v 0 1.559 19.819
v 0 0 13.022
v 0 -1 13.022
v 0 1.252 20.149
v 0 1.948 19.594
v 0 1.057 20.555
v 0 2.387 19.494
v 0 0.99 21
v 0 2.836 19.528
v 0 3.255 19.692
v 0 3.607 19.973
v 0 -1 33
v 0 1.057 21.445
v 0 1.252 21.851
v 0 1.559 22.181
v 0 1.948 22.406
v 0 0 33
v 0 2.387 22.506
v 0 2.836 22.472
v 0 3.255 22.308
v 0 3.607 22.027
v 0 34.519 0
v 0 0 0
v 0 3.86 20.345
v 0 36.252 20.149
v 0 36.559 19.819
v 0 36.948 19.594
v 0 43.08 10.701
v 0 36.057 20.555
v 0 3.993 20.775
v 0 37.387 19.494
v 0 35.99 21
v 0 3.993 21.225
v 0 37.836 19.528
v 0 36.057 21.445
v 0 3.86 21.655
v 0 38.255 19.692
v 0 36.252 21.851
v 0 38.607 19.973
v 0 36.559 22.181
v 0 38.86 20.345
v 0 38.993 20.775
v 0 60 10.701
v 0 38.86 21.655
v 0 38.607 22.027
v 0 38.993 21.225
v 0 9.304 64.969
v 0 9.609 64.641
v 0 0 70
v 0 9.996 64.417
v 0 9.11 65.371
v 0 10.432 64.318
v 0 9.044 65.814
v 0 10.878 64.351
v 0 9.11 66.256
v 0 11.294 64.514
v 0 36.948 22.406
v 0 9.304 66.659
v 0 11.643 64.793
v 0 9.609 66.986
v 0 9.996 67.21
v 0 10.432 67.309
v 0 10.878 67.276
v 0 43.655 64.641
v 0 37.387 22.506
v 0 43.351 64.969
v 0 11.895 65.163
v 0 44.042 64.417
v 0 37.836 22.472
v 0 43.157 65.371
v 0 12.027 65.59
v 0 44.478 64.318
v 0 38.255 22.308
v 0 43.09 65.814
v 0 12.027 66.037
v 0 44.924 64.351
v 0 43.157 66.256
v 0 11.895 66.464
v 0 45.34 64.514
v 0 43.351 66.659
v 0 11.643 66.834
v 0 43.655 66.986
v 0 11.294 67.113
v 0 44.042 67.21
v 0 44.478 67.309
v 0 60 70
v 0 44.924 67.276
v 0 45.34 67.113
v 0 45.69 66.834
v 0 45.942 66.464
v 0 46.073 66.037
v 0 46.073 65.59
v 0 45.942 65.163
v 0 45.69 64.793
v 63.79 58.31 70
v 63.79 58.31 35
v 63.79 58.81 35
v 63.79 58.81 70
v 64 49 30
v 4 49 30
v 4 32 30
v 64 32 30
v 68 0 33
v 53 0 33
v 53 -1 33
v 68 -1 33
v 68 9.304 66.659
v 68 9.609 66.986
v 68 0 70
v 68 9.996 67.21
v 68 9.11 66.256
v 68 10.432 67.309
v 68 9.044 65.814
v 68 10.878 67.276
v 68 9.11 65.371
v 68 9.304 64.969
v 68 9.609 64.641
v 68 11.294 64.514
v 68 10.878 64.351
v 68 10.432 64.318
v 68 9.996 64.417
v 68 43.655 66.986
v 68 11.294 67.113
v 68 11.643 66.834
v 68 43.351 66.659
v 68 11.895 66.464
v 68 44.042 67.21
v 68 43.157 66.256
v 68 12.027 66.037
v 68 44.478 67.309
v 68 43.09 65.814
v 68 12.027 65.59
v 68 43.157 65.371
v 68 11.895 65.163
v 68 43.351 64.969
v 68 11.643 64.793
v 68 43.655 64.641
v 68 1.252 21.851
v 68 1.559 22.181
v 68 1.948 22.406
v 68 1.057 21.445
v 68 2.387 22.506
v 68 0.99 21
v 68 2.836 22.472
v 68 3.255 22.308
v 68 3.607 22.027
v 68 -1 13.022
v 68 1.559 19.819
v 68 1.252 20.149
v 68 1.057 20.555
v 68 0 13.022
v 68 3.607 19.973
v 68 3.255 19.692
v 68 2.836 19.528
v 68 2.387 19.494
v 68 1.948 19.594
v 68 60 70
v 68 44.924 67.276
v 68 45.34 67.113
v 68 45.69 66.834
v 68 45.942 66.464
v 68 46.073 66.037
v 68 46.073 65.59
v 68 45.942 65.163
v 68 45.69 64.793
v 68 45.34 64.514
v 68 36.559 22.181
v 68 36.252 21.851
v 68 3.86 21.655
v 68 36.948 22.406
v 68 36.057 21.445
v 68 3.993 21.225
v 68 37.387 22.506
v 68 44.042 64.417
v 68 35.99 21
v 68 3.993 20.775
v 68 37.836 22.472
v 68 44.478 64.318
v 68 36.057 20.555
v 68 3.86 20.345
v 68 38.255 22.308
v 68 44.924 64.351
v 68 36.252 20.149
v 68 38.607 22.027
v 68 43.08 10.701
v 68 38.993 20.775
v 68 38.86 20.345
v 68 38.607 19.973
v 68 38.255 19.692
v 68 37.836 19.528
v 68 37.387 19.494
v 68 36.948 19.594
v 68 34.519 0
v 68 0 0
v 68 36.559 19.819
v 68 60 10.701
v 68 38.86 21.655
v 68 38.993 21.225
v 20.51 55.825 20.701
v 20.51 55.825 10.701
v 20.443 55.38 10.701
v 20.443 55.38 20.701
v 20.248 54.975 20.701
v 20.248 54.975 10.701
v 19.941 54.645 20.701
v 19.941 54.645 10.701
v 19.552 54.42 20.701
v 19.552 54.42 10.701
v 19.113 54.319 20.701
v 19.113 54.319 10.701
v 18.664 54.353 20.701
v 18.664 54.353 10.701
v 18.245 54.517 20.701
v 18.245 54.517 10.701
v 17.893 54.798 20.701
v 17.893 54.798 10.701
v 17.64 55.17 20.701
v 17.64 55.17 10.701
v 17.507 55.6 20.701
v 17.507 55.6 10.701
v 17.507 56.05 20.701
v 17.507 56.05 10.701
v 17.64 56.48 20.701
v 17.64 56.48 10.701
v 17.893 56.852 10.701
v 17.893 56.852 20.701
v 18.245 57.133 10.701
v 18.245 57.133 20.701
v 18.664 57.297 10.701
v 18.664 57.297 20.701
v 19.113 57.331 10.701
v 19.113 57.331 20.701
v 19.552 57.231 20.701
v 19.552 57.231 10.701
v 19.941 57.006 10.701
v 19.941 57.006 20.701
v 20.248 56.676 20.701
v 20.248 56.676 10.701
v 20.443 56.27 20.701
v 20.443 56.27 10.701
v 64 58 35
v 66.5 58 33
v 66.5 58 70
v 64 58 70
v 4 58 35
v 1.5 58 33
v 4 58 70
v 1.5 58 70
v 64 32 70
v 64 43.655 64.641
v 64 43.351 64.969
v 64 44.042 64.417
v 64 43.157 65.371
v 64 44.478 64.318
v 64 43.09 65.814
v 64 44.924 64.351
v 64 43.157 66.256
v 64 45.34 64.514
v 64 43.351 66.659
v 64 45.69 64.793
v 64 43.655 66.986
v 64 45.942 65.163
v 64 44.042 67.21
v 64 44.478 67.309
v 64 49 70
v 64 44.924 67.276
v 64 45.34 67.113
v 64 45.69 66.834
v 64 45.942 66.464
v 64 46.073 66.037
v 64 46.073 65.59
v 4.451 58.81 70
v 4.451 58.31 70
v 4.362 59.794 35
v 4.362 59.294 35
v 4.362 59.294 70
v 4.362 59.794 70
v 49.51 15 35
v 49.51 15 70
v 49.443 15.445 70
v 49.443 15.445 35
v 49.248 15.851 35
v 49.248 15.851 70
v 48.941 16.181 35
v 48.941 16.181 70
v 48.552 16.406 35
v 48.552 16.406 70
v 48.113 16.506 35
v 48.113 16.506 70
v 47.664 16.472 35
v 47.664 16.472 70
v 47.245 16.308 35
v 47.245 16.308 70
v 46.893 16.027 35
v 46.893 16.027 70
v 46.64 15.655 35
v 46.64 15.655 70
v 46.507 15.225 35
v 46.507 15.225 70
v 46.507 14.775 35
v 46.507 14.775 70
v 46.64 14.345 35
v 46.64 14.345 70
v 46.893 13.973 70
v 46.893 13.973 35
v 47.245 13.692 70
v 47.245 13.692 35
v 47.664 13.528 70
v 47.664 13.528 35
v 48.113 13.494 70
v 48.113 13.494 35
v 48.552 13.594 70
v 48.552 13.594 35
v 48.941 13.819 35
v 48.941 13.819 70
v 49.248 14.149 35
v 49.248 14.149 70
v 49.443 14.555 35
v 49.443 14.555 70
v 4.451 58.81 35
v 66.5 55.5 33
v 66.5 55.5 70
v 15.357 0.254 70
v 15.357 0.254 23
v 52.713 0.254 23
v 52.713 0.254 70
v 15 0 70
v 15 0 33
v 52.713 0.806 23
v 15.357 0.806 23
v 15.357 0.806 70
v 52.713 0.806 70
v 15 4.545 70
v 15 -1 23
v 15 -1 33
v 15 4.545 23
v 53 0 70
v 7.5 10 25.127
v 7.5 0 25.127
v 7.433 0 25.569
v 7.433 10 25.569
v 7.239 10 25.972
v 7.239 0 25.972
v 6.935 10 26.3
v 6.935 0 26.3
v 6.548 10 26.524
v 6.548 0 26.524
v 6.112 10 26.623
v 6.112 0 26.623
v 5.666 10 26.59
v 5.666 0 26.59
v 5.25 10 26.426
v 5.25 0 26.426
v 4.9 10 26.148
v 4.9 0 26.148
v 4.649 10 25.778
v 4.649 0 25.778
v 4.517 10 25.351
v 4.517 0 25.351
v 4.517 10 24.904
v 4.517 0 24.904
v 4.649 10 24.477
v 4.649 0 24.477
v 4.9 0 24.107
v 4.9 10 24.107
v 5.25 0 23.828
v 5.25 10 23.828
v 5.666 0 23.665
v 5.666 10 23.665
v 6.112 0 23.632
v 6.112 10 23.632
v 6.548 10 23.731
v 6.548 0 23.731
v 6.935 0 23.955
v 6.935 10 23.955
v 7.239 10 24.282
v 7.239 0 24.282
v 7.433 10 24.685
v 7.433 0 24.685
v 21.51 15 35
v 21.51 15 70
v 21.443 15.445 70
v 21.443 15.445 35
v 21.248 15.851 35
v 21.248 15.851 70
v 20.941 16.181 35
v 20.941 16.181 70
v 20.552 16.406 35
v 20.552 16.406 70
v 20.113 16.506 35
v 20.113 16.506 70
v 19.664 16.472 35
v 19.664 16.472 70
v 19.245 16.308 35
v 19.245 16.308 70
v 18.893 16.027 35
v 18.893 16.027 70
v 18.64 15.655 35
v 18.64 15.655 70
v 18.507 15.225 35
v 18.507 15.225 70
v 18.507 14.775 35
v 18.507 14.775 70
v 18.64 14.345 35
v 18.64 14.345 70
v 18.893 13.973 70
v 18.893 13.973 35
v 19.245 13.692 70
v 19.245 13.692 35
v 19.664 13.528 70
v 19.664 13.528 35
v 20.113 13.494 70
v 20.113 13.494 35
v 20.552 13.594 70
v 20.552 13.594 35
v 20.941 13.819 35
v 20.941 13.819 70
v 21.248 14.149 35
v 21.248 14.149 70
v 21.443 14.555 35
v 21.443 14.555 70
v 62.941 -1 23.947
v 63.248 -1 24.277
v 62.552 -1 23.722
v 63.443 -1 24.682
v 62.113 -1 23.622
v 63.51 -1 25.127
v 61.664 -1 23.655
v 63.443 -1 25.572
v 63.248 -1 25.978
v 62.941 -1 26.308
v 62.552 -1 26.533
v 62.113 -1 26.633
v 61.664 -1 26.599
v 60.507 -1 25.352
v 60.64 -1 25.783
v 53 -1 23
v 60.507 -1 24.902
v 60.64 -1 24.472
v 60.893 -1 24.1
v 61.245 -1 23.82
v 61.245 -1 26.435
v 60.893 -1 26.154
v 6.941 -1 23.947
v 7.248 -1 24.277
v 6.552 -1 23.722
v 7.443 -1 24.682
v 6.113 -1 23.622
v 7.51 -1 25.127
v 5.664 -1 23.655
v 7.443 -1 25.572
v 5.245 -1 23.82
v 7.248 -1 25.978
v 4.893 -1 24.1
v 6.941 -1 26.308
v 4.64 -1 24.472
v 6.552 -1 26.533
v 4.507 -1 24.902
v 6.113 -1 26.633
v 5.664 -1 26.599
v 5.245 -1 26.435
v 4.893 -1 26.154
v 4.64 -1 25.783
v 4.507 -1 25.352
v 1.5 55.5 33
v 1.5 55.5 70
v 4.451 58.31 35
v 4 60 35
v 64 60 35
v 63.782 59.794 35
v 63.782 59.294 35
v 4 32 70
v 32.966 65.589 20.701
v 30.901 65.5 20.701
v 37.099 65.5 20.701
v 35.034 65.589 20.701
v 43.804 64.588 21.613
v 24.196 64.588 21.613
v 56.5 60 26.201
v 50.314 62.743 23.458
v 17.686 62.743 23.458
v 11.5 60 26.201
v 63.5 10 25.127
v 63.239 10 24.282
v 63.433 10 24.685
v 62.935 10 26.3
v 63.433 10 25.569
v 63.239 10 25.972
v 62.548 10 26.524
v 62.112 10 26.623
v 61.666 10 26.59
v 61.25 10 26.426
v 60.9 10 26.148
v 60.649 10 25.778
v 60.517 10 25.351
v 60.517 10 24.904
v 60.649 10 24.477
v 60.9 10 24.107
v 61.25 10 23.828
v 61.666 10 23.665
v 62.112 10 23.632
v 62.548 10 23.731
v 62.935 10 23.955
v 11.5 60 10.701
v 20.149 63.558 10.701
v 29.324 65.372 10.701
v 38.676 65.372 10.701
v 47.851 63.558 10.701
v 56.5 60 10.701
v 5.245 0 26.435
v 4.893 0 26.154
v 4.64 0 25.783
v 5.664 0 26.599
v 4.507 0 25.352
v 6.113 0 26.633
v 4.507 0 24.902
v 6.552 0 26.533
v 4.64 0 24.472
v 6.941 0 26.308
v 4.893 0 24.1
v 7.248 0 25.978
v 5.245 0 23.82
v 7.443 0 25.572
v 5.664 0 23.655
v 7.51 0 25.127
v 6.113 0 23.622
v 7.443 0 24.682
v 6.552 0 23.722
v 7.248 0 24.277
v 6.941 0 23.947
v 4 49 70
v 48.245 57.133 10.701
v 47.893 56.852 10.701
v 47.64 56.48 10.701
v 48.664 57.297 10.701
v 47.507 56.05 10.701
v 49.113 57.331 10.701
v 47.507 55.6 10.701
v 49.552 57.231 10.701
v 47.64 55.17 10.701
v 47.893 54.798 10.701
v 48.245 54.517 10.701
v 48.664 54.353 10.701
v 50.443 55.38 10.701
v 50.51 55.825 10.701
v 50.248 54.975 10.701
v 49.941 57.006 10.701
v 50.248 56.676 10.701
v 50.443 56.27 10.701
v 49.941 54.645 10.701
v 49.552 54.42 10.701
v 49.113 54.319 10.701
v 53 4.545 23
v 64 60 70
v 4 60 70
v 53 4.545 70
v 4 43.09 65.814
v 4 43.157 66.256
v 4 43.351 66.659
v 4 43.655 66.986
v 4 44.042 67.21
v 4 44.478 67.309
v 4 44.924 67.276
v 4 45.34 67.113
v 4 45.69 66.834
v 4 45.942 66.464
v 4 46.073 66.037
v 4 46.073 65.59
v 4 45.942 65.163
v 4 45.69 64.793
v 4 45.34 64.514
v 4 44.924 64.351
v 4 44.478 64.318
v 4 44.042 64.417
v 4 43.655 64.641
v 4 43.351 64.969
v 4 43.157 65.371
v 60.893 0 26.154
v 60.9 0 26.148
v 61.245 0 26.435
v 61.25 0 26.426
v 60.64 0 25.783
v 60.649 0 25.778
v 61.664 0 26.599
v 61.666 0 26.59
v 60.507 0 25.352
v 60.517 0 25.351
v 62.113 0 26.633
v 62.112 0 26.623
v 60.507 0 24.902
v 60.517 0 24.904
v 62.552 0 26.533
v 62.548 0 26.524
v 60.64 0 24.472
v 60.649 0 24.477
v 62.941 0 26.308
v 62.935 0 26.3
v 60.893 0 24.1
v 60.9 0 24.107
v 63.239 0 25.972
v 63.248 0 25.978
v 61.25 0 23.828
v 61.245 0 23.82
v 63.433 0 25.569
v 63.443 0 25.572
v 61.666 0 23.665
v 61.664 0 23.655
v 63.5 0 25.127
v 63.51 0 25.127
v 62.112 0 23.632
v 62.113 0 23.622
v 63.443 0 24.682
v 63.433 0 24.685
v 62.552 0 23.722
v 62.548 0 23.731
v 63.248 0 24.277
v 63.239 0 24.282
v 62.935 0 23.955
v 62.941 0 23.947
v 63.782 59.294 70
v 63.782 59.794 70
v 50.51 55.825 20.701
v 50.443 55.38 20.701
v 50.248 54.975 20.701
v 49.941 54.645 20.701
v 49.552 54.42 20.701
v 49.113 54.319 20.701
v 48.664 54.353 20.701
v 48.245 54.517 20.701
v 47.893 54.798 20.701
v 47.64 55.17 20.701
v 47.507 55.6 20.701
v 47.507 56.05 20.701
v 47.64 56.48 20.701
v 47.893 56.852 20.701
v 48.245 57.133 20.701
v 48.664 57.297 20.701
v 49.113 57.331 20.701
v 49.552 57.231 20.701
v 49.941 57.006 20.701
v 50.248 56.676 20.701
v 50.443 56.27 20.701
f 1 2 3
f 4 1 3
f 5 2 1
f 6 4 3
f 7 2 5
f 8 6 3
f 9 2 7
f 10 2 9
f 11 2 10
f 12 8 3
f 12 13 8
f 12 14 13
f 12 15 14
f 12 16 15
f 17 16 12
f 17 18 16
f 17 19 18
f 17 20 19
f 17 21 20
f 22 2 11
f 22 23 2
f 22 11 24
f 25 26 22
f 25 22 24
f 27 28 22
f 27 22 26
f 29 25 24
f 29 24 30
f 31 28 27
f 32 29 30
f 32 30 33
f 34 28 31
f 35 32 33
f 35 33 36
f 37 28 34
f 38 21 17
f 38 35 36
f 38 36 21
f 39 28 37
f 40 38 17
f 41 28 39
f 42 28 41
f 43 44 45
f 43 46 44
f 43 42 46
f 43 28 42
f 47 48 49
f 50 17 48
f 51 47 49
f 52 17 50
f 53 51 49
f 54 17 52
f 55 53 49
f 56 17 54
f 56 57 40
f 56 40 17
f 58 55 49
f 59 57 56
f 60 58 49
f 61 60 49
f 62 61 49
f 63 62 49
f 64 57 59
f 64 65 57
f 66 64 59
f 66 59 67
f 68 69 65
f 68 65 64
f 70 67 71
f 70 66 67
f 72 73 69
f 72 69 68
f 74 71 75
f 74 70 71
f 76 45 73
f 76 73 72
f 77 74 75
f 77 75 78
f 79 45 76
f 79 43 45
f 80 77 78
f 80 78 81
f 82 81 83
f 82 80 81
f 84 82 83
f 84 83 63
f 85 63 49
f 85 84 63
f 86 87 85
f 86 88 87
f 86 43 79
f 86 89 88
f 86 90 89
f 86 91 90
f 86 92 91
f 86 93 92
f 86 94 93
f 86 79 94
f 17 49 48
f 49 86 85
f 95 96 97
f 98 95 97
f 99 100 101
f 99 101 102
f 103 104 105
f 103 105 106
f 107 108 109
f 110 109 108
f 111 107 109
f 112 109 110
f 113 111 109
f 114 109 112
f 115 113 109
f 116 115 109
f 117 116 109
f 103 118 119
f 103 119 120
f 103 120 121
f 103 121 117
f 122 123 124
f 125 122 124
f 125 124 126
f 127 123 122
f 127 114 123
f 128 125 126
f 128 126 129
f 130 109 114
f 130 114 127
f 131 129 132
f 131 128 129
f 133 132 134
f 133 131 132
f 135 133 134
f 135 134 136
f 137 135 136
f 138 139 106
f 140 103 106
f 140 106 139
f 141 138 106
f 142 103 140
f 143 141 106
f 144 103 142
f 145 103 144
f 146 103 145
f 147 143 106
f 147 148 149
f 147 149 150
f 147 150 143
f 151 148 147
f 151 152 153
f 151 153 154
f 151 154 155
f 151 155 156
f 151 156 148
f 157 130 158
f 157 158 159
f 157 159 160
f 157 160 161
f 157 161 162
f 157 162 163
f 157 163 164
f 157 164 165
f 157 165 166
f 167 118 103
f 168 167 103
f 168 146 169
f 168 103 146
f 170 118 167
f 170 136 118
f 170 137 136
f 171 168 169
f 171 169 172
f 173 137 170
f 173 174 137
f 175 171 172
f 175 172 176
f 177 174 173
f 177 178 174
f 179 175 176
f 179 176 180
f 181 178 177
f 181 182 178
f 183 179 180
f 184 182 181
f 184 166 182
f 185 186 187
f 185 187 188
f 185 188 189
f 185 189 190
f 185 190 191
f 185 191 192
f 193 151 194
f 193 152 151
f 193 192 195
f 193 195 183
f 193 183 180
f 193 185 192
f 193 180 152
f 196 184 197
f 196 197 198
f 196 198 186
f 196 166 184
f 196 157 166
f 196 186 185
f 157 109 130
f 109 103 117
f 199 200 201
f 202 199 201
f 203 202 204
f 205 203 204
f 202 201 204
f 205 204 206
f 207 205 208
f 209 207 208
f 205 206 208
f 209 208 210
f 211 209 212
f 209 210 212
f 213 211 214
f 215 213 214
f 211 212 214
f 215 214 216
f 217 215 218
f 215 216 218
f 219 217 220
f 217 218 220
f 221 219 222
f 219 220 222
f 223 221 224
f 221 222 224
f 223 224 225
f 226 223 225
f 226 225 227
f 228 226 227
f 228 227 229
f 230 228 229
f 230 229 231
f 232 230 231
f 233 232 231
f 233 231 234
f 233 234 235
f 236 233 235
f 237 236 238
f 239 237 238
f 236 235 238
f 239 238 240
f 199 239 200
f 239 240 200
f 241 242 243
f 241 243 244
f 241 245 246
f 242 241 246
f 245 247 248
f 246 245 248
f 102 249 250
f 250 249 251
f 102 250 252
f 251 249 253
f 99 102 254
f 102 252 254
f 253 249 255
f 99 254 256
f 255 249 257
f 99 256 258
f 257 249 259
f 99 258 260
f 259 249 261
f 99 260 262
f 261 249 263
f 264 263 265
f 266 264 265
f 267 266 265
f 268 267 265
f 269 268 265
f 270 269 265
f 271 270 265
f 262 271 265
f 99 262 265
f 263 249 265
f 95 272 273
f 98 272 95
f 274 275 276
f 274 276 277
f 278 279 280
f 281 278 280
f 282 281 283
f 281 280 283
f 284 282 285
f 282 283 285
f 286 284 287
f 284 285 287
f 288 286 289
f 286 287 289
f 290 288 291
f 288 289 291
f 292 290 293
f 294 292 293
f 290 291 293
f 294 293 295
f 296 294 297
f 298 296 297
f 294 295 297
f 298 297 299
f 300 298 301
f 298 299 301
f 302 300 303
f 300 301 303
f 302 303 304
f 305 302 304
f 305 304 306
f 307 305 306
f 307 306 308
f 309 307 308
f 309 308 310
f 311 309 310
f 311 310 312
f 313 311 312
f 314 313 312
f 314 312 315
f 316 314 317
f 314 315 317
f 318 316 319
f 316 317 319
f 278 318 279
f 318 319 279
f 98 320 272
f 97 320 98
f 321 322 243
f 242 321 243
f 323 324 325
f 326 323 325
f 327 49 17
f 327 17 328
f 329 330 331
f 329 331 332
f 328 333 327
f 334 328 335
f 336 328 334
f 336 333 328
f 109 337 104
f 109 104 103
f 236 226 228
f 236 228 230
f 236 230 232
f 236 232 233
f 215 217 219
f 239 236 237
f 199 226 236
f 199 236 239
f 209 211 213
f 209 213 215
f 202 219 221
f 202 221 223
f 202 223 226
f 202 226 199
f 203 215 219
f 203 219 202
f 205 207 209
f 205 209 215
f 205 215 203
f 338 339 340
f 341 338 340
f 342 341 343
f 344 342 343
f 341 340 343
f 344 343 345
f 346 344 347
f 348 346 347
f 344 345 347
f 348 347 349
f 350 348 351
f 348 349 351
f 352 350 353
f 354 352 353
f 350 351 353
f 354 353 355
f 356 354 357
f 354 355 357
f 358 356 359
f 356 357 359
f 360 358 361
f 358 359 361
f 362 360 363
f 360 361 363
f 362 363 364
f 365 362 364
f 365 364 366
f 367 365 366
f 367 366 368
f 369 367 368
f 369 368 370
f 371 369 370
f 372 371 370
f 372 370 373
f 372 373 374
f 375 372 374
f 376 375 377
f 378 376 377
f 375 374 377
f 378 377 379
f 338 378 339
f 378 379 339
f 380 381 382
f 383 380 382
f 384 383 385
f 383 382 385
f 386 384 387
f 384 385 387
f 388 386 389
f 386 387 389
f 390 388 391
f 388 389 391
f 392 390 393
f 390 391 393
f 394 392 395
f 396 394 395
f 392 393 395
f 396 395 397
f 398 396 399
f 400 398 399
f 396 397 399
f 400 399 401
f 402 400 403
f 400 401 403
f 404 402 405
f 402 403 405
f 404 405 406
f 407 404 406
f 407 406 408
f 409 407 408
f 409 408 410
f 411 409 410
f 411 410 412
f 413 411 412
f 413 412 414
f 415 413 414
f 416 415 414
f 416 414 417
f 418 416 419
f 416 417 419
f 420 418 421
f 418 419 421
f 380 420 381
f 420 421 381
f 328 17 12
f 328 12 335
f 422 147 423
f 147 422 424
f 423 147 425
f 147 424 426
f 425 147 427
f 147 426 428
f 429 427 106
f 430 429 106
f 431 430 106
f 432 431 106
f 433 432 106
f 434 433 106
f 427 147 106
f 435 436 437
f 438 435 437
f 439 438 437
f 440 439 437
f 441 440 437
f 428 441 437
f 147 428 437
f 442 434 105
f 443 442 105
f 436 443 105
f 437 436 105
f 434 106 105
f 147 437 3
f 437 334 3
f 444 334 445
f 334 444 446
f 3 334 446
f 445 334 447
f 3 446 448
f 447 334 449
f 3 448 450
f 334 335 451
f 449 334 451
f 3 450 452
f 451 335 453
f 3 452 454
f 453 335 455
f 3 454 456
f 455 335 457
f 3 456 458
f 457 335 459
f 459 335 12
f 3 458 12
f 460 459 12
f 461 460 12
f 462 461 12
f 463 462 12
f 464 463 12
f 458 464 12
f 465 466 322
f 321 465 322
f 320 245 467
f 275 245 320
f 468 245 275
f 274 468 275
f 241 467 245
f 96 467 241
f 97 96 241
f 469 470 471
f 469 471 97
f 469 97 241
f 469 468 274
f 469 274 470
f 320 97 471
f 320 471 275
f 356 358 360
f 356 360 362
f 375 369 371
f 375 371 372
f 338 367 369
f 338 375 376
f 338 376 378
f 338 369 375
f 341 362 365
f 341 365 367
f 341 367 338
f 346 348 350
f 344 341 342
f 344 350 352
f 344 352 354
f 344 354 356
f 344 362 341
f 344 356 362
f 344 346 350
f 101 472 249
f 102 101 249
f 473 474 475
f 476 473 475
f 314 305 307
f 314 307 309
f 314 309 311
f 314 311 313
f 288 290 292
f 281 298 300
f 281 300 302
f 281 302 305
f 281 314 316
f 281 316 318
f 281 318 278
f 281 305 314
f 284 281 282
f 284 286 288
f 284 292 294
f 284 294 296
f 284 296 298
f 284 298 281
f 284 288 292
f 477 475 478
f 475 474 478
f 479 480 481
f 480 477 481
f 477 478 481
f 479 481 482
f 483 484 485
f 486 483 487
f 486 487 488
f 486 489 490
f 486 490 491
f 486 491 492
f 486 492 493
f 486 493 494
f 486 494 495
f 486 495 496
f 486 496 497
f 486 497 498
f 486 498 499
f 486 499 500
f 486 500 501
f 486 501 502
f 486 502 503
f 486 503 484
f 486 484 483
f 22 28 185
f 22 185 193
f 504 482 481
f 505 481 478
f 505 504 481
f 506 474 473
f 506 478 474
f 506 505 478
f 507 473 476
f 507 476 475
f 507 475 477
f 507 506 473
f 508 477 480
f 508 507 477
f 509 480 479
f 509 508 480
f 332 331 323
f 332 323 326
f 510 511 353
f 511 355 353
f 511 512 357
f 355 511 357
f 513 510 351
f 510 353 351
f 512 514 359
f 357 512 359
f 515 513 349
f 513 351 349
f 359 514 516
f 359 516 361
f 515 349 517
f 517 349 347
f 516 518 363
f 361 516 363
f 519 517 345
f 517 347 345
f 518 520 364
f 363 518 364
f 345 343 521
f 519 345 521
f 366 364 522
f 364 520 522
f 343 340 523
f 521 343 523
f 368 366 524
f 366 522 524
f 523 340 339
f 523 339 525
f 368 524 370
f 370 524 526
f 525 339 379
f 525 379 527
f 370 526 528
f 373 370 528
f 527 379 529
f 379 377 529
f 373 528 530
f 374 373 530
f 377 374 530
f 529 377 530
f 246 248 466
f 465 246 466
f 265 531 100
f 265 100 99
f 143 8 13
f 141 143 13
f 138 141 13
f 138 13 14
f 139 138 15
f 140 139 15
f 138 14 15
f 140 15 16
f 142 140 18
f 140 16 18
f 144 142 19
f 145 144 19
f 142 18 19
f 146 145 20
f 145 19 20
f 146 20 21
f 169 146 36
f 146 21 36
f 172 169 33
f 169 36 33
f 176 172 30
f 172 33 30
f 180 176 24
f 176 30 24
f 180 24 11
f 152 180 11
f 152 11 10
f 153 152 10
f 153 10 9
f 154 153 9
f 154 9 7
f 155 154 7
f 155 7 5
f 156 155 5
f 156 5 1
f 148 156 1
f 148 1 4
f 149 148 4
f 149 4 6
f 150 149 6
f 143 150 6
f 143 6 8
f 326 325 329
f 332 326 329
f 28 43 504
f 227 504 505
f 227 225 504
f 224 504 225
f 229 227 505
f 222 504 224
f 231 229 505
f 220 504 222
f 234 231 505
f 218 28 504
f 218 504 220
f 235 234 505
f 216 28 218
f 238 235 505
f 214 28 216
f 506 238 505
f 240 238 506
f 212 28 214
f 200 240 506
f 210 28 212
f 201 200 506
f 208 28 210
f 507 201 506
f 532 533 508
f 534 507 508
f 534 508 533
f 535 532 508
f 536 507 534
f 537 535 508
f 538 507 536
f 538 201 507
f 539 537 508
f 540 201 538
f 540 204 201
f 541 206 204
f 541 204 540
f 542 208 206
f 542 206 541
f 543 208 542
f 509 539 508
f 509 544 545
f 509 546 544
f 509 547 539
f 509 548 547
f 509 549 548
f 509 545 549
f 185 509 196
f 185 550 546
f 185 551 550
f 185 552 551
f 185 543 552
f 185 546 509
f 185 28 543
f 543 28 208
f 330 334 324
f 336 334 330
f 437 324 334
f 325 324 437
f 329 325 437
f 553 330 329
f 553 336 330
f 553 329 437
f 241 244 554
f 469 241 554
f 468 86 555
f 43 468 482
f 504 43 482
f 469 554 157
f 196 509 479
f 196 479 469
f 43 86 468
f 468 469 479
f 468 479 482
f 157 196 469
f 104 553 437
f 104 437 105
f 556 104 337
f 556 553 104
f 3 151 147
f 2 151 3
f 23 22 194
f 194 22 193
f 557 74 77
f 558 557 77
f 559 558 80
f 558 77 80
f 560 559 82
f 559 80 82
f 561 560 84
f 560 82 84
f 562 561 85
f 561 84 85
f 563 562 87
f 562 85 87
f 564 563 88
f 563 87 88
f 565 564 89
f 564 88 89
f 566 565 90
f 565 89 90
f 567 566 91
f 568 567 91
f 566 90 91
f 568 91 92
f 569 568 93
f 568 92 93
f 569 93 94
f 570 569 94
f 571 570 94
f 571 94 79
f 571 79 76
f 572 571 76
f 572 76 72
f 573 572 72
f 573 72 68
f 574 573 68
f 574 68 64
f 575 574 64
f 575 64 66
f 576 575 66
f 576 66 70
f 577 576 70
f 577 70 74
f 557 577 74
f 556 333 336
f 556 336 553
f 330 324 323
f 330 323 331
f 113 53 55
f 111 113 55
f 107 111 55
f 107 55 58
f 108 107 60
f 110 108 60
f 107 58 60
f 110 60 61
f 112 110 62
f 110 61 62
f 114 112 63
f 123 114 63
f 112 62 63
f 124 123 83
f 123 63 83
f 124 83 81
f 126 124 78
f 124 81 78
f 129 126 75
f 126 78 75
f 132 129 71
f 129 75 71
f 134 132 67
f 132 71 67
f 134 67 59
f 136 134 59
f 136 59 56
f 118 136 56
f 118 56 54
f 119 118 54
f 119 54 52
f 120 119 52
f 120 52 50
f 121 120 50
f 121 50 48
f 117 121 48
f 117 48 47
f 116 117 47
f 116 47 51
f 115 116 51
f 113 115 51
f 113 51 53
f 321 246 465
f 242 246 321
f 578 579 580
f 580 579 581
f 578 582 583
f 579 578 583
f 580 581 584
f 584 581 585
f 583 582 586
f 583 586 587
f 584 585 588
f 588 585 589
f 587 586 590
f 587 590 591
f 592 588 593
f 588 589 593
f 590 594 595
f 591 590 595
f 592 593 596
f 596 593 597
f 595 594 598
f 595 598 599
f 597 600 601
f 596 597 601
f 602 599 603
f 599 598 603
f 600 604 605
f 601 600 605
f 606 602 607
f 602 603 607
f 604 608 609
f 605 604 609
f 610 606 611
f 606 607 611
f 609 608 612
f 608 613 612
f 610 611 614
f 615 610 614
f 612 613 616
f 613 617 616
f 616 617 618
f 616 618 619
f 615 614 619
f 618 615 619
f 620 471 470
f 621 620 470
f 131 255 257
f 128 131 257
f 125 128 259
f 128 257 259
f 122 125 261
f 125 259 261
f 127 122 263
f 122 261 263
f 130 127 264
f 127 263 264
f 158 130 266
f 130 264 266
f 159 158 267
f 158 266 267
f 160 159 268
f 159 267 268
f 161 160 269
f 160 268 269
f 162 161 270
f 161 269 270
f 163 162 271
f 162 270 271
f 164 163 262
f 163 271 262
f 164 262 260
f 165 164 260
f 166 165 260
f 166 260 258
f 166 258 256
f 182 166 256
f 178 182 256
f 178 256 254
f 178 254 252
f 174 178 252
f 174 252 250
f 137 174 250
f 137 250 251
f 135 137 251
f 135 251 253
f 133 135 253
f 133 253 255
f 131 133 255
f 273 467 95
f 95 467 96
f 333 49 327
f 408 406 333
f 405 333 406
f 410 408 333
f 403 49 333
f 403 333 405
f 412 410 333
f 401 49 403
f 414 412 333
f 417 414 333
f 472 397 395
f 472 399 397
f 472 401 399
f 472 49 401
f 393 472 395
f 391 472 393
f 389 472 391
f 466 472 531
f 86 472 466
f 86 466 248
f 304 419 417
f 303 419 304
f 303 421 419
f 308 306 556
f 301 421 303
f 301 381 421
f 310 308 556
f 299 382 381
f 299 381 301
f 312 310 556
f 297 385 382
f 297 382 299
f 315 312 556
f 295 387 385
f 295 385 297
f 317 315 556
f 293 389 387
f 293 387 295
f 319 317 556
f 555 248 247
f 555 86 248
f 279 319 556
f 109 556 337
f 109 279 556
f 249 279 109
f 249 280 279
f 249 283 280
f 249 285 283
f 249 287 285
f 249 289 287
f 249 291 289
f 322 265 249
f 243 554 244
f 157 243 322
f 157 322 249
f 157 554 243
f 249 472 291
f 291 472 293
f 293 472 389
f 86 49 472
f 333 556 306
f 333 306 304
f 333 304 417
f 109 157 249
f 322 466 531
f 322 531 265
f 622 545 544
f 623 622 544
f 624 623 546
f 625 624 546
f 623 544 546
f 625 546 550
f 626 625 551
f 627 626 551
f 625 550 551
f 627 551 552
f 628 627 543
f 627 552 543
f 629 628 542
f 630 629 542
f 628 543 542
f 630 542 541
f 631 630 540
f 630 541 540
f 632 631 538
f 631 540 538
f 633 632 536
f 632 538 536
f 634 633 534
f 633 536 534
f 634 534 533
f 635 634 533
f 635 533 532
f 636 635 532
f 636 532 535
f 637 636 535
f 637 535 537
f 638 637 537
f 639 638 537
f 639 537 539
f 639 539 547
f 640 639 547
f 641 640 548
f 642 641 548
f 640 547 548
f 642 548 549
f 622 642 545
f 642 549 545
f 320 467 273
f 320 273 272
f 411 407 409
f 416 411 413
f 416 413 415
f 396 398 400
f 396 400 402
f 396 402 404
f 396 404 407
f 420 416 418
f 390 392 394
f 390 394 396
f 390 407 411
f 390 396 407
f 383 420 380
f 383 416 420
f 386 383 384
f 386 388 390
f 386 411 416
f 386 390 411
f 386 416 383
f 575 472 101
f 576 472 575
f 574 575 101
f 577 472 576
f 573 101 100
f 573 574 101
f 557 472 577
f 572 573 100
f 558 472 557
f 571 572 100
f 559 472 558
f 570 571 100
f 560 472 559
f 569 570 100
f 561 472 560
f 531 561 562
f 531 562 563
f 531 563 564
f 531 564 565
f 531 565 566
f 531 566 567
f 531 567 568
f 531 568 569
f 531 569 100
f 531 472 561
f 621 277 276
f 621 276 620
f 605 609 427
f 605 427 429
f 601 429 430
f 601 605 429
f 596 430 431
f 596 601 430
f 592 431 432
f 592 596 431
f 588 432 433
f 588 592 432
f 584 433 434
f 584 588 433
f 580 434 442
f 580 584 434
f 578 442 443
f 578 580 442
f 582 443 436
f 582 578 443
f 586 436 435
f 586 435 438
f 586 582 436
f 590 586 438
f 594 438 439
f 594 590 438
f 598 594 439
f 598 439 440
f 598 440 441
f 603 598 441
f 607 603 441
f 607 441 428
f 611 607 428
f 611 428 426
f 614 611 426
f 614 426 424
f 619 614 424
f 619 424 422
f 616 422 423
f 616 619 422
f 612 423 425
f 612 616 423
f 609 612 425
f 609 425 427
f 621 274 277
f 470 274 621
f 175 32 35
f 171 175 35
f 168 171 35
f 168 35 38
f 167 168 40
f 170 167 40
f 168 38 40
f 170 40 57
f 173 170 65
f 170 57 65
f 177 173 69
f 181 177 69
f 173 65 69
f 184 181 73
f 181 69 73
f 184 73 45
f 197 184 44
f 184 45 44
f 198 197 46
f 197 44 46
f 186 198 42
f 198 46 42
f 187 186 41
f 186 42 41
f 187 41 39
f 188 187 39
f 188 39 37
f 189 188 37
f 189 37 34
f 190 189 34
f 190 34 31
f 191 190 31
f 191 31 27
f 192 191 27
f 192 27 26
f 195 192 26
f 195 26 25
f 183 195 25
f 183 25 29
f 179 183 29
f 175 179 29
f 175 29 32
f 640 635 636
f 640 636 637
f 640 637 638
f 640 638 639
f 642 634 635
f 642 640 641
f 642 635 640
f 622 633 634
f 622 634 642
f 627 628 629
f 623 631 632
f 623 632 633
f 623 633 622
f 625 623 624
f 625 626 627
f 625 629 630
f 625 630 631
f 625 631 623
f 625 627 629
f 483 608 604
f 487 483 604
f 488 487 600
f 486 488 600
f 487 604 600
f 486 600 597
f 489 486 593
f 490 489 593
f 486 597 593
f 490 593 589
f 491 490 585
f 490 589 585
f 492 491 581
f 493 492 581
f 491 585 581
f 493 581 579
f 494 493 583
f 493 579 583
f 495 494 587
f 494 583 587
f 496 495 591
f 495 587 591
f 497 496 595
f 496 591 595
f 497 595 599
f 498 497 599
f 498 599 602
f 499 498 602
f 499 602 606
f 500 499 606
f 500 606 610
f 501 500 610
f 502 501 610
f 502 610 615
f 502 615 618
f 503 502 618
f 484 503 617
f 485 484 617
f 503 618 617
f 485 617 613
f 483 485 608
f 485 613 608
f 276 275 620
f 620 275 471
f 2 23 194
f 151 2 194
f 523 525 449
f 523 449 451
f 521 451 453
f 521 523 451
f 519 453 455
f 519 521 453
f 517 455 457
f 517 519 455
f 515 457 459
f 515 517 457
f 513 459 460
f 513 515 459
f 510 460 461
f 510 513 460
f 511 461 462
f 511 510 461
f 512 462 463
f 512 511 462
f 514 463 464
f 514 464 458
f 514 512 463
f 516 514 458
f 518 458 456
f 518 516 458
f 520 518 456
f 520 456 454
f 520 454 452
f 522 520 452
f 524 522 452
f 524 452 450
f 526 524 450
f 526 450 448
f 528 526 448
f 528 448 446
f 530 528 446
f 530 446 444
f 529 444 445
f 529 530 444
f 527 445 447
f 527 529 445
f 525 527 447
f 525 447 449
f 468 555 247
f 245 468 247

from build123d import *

# Parameters (mm, degrees)
BOX_W           = 68
BOX_H           = 60
BOX_DEPTH       = 70
SKETCH_R        = 1.51
POCKET_DEPTH    = 35
SKETCH001_W     = 65
SKETCH001_H     = 2.5
POCKET001_DEPTH = 2
SKETCH002_W     = 60
SKETCH002_H     = 17
POCKET002_DEPTH = 40
SKETCH003_W     = 38
SKETCH003_H     = 9.413655
POCKET003_DEPTH = 47
SKETCH004_R     = 1.51
POCKET004_DEPTH = 68.001
POCKET005_DEPTH = 68.001
SKETCH006_R     = 1.51
POCKET006_DEPTH = 10
PAD_DEPTH       = 10
CHAMFER001_SIZE = 5.5
SKETCH008_R     = 1.5
POCKET007_DEPTH = 68.001
SKETCH009_W     = 59.42001
SKETCH009_H     = 0.5
SKETCH009_W_2   = 59.338872
PAD001_DEPTH    = 35
SKETCH010_W     = 37.356884
SKETCH010_H     = 0.551608
PAD002_DEPTH    = 47
SKETCH011_R     = 1.5
POCKET008_DEPTH = 10
SKETCH012_R     = 1.51
PAD003_DEPTH    = 1


with BuildPart() as part:
    # Box → Box (new body)
    with BuildSketch(Plane(origin=(0, -2, 0), x_dir=(1, 0, 0), z_dir=(0, 0, 1))):
        with Locations((34, 30)):
            Rectangle(BOX_W, BOX_H)
    extrude(amount=BOX_DEPTH)


with BuildPart() as part_1:
    # BaseFeature placement: moved
    add(part.part.moved(Location((0, 2, 0))))

    # Sketch (on Face6 of BaseFeature) → Pocket (cut)
    with BuildSketch(Plane.XY.offset(70)):
        with Locations((20, 15)):
            Circle(SKETCH_R)
        with Locations((48, 15)):
            Circle(SKETCH_R)
        Polygon((1.5, 55.5), (66.5, 55.5), (66.5, 58), (64, 58), (64, 62.74518), (4, 62.74518), (4, 58), (1.5, 58), align=None)
    extrude(amount=-POCKET_DEPTH, mode=Mode.SUBTRACT)

    # Sketch001 (on Face16 of Pocket) → Pocket001 (cut)
    with BuildSketch(Plane.XY.offset(35)):
        with Locations((34, 56.75)):
            Rectangle(SKETCH001_W, SKETCH001_H)
    extrude(amount=-POCKET001_DEPTH, mode=Mode.SUBTRACT)

    # Sketch002 (on Face3 of Pocket001) → Pocket002 (cut)
    with BuildSketch(Plane.XY.offset(70)):
        with Locations((34, 40.5)):
            Rectangle(SKETCH002_W, SKETCH002_H)
    extrude(amount=-POCKET002_DEPTH, mode=Mode.SUBTRACT)

    # Sketch003 (on Face3 of Pocket002) → Pocket003 (cut)
    with BuildSketch(Plane.XY.offset(70)):
        with Locations((34, -0.162125)):
            Rectangle(SKETCH003_W, SKETCH003_H)
    extrude(amount=-POCKET003_DEPTH, mode=Mode.SUBTRACT)

    # Sketch004 (on Face1 of Pocket003) → Pocket004 (cut, through all)
    with BuildSketch(Plane(origin=(0, 0, 0), x_dir=(0, -1, 0), z_dir=(-1, 0, 0))):
        with Locations((-37.5, 21)):
            Circle(SKETCH004_R)
        with Locations((-2.5, 21)):
            Circle(SKETCH004_R)
    extrude(amount=-POCKET004_DEPTH, mode=Mode.SUBTRACT)

    # Sketch005 (on Face8 of Pocket004) → Pocket005 (cut, through all)
    with BuildSketch(Plane.YZ.offset(68)):
        Polygon((25.567, -11.191082), (76.135516, -11.191082), (76.135516, 10.70104), (43.079702, 10.70104), align=None)
    extrude(amount=-POCKET005_DEPTH, mode=Mode.SUBTRACT)

    # Sketch006 (on Face4 of Pocket005) → Pocket006 (cut)
    with BuildSketch(Plane(origin=(0, 0, 10.70104), x_dir=(1, 0, 0), z_dir=(0, 0, -1))):
        with Locations((19, -55.82514)):
            Circle(SKETCH006_R)
        with Locations((49, -55.82514)):
            Circle(SKETCH006_R)
    extrude(amount=-POCKET006_DEPTH, mode=Mode.SUBTRACT)

    # Sketch007 (on Face4 of Pocket006) → Pad (join)
    with BuildSketch(Plane(origin=(0, 0, 10.70104), x_dir=(1, 0, 0), z_dir=(0, 0, -1))):
        with BuildLine():
            ThreePointArc((11.5, -60), (34, -65.600118), (56.5, -60))
            Line((54.883537, -58.581185), (56.5, -60))
            Line((13.061421, -58.581185), (54.883537, -58.581185))
            Line((11.5, -60), (13.061421, -58.581185))
        make_face()
    extrude(amount=-PAD_DEPTH)

    # Chamfer001
    chamfer001_edges = [part_1.edges().sort_by_distance(p)[0] for p in [
        (34, 60, 20.70104),
    ]]
    chamfer(chamfer001_edges, length=CHAMFER001_SIZE)

    # Sketch008 (on Face8 of Chamfer001) → Pocket007 (cut, through all)
    with BuildSketch(Plane(origin=(0, 0, 0), x_dir=(0, -1, 0), z_dir=(-1, 0, 0))):
        with Locations((-44.590099, 65.813534)):
            Circle(SKETCH008_R)
        with Locations((-10.543741, 65.813534)):
            Circle(SKETCH008_R)
    extrude(amount=-POCKET007_DEPTH, mode=Mode.SUBTRACT)

    # Sketch009 (on Face1 of ReferenceChamfer002001) → Pad001 (join)
    with BuildSketch(Plane.XY.offset(35)):
        with Locations((34.071956, 59.544491)):
            Rectangle(SKETCH009_W, SKETCH009_H)
        with Locations((34.120748, 58.559672)):
            Rectangle(SKETCH009_W_2, SKETCH009_H)
    extrude(amount=PAD001_DEPTH)

    # Sketch010 (on Face49 of Pad001) → Pad002 (join)
    with BuildSketch(Plane.XY.offset(23)):
        with Locations((34.035056, 0.529754)):
            Rectangle(SKETCH010_W, SKETCH010_H)
    extrude(amount=PAD002_DEPTH)

    # Sketch011 (on Face17 of Pad002) → Pocket008 (cut)
    with BuildSketch(Plane.XZ):
        with Locations((6, 25.127343)):
            Circle(SKETCH011_R)
        with Locations((62, 25.127343)):
            Circle(SKETCH011_R)
    extrude(amount=-POCKET008_DEPTH, mode=Mode.SUBTRACT)

    # Sketch012 (on Face17 of Pocket008) → Pad003 (join)
    with BuildSketch(Plane.XZ):
        Polygon((0, 33), (15, 33), (15, 23), (53, 23), (53, 33), (68, 33), (68, 13.022348), (0, 13.022348), align=None)
        with Locations((6, 25.127343)):
            Circle(SKETCH012_R, mode=Mode.SUBTRACT)
        with Locations((62, 25.127343)):
            Circle(SKETCH012_R, mode=Mode.SUBTRACT)
    extrude(amount=PAD003_DEPTH)


solid = part_1.part
